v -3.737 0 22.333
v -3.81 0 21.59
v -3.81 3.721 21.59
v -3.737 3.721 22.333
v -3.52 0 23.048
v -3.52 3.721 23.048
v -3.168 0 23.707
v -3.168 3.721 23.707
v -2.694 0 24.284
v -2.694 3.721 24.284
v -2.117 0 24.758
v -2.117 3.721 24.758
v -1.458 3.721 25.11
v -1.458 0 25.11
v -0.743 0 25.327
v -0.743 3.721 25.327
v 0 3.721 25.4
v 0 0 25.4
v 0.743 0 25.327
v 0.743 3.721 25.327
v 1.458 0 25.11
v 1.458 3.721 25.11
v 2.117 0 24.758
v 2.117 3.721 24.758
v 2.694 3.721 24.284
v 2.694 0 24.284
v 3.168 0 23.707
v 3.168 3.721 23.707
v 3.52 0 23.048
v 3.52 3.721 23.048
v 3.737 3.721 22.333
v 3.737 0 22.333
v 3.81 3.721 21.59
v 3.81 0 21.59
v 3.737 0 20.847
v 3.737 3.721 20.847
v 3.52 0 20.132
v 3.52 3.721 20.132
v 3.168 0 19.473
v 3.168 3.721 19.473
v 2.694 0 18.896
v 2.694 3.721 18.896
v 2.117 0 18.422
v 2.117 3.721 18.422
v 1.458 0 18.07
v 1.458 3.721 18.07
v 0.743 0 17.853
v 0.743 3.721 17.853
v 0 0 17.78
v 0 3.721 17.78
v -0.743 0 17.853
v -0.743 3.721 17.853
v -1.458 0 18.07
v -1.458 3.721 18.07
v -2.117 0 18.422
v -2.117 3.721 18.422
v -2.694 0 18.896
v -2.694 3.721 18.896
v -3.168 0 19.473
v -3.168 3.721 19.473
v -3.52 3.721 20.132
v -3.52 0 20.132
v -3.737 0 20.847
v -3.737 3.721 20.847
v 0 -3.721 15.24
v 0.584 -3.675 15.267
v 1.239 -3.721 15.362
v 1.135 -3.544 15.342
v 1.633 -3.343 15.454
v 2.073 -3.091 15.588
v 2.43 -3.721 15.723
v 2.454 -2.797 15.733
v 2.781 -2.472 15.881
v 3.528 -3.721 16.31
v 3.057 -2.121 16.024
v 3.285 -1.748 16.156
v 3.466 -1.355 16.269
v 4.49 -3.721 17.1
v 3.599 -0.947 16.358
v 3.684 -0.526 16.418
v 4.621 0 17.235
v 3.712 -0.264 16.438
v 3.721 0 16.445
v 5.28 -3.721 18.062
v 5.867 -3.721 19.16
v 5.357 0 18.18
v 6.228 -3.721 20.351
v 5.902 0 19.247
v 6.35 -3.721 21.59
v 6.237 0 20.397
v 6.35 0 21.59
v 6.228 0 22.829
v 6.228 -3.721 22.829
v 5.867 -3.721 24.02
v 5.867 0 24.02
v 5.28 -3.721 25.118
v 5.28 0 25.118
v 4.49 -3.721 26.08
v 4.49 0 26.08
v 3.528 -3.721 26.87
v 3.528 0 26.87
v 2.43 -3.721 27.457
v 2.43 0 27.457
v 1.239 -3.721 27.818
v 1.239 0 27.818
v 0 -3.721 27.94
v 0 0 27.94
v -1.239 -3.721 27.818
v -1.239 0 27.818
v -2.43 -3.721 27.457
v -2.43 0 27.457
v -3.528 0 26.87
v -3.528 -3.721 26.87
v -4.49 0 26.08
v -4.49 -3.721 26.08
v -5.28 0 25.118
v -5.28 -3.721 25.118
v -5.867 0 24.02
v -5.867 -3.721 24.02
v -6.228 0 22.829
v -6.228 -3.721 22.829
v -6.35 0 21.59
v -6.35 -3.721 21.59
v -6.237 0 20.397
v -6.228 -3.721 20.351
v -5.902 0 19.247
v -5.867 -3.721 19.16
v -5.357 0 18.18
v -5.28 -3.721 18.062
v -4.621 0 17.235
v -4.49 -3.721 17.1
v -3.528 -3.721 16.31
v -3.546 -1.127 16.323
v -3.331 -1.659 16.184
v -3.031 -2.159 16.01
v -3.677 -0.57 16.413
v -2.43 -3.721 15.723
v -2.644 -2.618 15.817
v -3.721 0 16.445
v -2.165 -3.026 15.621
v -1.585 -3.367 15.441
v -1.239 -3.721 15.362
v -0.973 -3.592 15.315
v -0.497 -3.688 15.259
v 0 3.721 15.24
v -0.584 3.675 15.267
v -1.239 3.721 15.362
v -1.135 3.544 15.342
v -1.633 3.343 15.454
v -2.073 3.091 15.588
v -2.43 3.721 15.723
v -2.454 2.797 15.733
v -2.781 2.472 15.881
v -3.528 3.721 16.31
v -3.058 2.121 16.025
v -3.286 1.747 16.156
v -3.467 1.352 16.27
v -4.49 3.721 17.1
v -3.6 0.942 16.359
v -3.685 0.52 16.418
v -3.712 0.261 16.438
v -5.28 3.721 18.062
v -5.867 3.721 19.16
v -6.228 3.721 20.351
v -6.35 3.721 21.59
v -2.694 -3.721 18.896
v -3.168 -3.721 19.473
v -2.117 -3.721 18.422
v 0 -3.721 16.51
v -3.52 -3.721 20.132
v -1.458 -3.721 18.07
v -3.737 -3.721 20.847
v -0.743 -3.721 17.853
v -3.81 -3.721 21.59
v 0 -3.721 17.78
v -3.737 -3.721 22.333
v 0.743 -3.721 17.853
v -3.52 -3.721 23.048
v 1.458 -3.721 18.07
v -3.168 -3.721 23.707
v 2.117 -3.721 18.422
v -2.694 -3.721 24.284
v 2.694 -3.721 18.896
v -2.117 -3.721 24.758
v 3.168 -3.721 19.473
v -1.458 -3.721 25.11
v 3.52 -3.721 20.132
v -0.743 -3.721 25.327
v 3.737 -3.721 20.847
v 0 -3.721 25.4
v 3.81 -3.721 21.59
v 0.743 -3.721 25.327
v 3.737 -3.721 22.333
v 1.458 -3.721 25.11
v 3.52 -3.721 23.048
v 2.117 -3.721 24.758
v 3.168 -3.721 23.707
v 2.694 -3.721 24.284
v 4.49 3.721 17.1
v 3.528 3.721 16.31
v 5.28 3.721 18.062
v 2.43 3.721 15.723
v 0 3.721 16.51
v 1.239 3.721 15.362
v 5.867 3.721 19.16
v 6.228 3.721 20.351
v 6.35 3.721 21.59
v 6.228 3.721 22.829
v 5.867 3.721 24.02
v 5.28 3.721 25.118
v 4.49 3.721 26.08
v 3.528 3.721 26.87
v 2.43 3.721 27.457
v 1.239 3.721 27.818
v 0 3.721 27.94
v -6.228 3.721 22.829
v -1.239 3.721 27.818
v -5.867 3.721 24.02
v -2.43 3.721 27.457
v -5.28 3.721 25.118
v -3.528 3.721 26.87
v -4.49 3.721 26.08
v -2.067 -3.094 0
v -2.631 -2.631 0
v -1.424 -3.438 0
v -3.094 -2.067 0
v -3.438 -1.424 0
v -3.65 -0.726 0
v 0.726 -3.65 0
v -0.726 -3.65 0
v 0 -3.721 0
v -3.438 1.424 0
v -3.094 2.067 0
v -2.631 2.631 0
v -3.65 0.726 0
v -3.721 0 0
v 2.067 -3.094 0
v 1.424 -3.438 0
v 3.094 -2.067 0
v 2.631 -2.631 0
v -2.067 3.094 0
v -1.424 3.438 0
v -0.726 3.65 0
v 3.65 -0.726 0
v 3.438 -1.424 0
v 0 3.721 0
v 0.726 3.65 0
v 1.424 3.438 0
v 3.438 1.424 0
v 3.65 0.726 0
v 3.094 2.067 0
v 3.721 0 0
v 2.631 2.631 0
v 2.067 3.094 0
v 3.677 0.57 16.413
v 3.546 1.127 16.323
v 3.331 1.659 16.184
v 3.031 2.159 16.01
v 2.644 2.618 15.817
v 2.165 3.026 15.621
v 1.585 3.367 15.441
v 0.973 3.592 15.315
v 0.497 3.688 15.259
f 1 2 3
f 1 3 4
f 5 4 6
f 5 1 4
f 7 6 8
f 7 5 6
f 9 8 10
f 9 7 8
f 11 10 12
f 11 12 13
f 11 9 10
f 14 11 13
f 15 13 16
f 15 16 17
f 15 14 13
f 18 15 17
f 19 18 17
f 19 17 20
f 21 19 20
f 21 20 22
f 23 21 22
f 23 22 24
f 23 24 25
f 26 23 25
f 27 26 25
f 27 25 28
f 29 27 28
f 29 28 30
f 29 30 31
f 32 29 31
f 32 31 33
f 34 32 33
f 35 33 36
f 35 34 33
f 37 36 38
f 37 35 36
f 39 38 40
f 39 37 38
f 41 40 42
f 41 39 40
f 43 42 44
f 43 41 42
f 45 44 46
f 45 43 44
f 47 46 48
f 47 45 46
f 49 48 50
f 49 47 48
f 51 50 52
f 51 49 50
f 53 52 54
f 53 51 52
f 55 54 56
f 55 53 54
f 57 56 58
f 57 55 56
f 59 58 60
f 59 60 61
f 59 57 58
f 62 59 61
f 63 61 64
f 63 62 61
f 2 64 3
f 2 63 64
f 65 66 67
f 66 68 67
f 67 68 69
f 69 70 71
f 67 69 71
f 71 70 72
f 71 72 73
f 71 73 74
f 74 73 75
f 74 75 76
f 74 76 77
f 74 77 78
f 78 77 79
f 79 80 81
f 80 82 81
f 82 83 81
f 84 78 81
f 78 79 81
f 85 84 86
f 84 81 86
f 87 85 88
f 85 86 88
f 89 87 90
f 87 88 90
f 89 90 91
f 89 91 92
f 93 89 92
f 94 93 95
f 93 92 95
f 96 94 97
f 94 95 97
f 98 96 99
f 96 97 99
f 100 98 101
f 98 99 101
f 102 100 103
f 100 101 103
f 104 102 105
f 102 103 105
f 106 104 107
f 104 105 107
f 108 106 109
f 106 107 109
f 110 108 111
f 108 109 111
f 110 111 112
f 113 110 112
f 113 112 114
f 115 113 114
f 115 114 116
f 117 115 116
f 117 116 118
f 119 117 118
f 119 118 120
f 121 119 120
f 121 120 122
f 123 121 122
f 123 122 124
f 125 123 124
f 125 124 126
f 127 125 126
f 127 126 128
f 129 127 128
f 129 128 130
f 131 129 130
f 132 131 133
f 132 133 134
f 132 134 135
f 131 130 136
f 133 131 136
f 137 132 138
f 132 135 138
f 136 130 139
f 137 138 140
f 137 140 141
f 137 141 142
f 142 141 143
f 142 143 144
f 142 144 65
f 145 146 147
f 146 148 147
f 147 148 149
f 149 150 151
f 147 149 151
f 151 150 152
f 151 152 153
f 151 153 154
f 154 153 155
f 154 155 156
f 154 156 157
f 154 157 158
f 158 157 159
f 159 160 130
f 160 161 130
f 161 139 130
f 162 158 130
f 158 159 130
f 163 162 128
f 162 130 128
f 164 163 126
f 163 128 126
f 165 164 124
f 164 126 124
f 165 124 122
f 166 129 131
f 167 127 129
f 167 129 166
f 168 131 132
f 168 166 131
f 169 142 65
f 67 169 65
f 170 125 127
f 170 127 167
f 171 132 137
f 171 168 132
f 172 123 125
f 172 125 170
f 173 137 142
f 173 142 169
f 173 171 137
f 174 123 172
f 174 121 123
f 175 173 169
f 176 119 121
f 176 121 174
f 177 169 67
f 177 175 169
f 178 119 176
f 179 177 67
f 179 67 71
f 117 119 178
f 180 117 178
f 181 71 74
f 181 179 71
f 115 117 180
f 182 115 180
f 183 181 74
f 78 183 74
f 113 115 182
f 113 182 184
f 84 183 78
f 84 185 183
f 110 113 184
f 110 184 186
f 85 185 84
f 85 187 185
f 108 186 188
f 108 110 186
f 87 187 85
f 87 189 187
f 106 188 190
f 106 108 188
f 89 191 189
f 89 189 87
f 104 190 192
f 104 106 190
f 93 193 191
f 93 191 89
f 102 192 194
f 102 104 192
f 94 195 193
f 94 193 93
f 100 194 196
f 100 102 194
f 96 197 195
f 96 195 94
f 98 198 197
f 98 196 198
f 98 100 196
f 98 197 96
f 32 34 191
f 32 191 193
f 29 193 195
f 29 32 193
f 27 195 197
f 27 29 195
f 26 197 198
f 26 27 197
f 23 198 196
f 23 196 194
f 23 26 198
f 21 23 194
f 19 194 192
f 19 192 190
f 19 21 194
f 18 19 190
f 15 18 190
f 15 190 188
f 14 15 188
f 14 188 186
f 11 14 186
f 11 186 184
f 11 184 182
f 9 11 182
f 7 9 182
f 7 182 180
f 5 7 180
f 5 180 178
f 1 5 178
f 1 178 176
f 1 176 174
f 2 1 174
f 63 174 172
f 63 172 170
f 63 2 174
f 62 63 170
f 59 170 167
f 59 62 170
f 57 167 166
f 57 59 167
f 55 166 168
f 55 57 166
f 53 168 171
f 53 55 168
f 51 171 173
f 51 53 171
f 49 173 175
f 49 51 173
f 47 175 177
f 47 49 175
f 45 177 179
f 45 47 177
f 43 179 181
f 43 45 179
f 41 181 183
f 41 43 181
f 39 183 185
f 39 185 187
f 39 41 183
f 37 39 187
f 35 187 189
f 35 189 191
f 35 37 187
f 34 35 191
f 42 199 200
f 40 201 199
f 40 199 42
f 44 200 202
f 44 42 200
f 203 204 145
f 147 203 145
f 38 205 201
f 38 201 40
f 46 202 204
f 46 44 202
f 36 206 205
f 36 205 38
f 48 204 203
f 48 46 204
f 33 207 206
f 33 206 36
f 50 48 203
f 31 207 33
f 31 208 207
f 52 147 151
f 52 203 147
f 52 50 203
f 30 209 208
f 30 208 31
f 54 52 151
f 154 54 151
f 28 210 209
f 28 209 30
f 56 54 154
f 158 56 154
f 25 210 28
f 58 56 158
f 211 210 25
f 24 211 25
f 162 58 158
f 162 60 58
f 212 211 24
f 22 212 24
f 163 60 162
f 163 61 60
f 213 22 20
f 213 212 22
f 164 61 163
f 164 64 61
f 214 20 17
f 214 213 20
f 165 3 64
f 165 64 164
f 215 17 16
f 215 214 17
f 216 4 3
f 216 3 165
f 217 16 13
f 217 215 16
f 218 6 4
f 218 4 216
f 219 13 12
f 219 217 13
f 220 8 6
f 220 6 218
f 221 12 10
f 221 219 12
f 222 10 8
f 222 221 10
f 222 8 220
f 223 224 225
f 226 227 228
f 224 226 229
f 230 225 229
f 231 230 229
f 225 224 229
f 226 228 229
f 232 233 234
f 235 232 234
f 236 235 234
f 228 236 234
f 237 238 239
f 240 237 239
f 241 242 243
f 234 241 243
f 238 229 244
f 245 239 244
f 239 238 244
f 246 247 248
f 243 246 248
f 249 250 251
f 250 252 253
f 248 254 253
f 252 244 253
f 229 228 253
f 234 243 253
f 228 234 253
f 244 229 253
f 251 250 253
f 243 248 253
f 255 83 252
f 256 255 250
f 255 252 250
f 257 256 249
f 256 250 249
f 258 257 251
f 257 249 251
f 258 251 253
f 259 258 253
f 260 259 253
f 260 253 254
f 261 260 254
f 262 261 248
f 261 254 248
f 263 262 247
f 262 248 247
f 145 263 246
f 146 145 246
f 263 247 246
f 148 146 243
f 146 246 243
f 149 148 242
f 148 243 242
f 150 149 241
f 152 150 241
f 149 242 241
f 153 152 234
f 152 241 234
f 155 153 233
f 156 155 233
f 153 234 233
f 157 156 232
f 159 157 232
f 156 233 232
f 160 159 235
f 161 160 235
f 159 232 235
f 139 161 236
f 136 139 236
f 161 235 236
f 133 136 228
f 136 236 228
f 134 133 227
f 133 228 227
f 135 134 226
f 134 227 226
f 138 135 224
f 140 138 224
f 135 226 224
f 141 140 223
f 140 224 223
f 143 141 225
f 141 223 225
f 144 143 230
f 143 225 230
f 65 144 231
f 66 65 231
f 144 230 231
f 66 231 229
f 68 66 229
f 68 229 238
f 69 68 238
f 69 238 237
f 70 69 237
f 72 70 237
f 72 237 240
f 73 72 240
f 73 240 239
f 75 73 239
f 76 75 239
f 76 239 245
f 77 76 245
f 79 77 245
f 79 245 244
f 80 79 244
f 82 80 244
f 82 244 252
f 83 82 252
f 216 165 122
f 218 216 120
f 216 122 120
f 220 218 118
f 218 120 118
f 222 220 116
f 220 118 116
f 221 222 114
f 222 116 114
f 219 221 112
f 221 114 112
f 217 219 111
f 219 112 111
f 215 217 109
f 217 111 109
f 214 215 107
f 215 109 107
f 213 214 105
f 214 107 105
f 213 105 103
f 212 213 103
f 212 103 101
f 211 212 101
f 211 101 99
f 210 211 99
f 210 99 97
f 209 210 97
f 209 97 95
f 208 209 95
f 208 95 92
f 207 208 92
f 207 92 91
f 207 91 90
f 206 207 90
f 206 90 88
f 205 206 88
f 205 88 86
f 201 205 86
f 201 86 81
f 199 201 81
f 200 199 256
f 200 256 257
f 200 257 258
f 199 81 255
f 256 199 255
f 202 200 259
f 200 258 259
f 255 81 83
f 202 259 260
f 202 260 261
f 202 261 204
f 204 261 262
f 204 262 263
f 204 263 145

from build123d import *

# Parameters (mm, degrees)
F0_R      = 3.7211
F1_DEPTH  = 15.24
F3_W      = 11.0588753596
F3_H      = 5.0897249021
F4_DEPTH  = 25.4
F5_R      = 6.35
F5_R_2    = 3.81
F6_DEPTH  = 3.7211
F7_W      = 11.0588753596
F7_H      = 5.0897249021
F8_DEPTH  = 25.4
F9_R      = 6.35
F9_R_2    = 3.81
F10_DEPTH = 3.7211
F11_R     = 3.7211
F12_DEPTH = 1.27


with BuildPart() as f1:
    # F0 (on Top) → F1 (new body)
    with BuildSketch(Plane.XY):
        Circle(F0_R)
    extrude(amount=F1_DEPTH)

    # F3 (on face) → F4 (join)
    with BuildSketch(Plane.XY.offset(15.24)):
        with Locations((5.5294376798, 2.544862451)):
            Rectangle(F3_W, F3_H)
    extrude(amount=F4_DEPTH)

    # F7 (on face) → F8 (cut)
    with BuildSketch(Plane.XY.offset(40.64)):
        with Locations((5.5294376798, 2.544862451)):
            Rectangle(F7_W, F7_H)
    extrude(amount=-F8_DEPTH, mode=Mode.SUBTRACT)



with BuildPart() as f6:
    # F5 (on face) → F6 (new body)
    with BuildSketch(Plane.XZ):
        with Locations((0, 21.59)):
            Circle(F5_R)
        with Locations((0, 21.59)):
            Circle(F5_R_2, mode=Mode.SUBTRACT)
    extrude(amount=F6_DEPTH)


with BuildPart() as f10:
    # F9 (on face) → F10 (new body)
    with BuildSketch(Plane(origin=(0, 0, 0), x_dir=(-1, 0, 0), z_dir=(0, 1, 0))):
        with Locations((0, 21.59)):
            Circle(F9_R)
        with Locations((0, 21.59)):
            Circle(F9_R_2, mode=Mode.SUBTRACT)
    extrude(amount=F10_DEPTH)


with BuildPart() as f1_1:
    add(f1.part)

    add(f6.part)  # F12 merges F6

    add(f10.part)  # F12 merges F10
    # F11 (on face) → F12 (join)
    with BuildSketch(Plane.XY.offset(15.24)):
        Circle(F11_R)
    extrude(amount=F12_DEPTH)


solid = f1_1.part
